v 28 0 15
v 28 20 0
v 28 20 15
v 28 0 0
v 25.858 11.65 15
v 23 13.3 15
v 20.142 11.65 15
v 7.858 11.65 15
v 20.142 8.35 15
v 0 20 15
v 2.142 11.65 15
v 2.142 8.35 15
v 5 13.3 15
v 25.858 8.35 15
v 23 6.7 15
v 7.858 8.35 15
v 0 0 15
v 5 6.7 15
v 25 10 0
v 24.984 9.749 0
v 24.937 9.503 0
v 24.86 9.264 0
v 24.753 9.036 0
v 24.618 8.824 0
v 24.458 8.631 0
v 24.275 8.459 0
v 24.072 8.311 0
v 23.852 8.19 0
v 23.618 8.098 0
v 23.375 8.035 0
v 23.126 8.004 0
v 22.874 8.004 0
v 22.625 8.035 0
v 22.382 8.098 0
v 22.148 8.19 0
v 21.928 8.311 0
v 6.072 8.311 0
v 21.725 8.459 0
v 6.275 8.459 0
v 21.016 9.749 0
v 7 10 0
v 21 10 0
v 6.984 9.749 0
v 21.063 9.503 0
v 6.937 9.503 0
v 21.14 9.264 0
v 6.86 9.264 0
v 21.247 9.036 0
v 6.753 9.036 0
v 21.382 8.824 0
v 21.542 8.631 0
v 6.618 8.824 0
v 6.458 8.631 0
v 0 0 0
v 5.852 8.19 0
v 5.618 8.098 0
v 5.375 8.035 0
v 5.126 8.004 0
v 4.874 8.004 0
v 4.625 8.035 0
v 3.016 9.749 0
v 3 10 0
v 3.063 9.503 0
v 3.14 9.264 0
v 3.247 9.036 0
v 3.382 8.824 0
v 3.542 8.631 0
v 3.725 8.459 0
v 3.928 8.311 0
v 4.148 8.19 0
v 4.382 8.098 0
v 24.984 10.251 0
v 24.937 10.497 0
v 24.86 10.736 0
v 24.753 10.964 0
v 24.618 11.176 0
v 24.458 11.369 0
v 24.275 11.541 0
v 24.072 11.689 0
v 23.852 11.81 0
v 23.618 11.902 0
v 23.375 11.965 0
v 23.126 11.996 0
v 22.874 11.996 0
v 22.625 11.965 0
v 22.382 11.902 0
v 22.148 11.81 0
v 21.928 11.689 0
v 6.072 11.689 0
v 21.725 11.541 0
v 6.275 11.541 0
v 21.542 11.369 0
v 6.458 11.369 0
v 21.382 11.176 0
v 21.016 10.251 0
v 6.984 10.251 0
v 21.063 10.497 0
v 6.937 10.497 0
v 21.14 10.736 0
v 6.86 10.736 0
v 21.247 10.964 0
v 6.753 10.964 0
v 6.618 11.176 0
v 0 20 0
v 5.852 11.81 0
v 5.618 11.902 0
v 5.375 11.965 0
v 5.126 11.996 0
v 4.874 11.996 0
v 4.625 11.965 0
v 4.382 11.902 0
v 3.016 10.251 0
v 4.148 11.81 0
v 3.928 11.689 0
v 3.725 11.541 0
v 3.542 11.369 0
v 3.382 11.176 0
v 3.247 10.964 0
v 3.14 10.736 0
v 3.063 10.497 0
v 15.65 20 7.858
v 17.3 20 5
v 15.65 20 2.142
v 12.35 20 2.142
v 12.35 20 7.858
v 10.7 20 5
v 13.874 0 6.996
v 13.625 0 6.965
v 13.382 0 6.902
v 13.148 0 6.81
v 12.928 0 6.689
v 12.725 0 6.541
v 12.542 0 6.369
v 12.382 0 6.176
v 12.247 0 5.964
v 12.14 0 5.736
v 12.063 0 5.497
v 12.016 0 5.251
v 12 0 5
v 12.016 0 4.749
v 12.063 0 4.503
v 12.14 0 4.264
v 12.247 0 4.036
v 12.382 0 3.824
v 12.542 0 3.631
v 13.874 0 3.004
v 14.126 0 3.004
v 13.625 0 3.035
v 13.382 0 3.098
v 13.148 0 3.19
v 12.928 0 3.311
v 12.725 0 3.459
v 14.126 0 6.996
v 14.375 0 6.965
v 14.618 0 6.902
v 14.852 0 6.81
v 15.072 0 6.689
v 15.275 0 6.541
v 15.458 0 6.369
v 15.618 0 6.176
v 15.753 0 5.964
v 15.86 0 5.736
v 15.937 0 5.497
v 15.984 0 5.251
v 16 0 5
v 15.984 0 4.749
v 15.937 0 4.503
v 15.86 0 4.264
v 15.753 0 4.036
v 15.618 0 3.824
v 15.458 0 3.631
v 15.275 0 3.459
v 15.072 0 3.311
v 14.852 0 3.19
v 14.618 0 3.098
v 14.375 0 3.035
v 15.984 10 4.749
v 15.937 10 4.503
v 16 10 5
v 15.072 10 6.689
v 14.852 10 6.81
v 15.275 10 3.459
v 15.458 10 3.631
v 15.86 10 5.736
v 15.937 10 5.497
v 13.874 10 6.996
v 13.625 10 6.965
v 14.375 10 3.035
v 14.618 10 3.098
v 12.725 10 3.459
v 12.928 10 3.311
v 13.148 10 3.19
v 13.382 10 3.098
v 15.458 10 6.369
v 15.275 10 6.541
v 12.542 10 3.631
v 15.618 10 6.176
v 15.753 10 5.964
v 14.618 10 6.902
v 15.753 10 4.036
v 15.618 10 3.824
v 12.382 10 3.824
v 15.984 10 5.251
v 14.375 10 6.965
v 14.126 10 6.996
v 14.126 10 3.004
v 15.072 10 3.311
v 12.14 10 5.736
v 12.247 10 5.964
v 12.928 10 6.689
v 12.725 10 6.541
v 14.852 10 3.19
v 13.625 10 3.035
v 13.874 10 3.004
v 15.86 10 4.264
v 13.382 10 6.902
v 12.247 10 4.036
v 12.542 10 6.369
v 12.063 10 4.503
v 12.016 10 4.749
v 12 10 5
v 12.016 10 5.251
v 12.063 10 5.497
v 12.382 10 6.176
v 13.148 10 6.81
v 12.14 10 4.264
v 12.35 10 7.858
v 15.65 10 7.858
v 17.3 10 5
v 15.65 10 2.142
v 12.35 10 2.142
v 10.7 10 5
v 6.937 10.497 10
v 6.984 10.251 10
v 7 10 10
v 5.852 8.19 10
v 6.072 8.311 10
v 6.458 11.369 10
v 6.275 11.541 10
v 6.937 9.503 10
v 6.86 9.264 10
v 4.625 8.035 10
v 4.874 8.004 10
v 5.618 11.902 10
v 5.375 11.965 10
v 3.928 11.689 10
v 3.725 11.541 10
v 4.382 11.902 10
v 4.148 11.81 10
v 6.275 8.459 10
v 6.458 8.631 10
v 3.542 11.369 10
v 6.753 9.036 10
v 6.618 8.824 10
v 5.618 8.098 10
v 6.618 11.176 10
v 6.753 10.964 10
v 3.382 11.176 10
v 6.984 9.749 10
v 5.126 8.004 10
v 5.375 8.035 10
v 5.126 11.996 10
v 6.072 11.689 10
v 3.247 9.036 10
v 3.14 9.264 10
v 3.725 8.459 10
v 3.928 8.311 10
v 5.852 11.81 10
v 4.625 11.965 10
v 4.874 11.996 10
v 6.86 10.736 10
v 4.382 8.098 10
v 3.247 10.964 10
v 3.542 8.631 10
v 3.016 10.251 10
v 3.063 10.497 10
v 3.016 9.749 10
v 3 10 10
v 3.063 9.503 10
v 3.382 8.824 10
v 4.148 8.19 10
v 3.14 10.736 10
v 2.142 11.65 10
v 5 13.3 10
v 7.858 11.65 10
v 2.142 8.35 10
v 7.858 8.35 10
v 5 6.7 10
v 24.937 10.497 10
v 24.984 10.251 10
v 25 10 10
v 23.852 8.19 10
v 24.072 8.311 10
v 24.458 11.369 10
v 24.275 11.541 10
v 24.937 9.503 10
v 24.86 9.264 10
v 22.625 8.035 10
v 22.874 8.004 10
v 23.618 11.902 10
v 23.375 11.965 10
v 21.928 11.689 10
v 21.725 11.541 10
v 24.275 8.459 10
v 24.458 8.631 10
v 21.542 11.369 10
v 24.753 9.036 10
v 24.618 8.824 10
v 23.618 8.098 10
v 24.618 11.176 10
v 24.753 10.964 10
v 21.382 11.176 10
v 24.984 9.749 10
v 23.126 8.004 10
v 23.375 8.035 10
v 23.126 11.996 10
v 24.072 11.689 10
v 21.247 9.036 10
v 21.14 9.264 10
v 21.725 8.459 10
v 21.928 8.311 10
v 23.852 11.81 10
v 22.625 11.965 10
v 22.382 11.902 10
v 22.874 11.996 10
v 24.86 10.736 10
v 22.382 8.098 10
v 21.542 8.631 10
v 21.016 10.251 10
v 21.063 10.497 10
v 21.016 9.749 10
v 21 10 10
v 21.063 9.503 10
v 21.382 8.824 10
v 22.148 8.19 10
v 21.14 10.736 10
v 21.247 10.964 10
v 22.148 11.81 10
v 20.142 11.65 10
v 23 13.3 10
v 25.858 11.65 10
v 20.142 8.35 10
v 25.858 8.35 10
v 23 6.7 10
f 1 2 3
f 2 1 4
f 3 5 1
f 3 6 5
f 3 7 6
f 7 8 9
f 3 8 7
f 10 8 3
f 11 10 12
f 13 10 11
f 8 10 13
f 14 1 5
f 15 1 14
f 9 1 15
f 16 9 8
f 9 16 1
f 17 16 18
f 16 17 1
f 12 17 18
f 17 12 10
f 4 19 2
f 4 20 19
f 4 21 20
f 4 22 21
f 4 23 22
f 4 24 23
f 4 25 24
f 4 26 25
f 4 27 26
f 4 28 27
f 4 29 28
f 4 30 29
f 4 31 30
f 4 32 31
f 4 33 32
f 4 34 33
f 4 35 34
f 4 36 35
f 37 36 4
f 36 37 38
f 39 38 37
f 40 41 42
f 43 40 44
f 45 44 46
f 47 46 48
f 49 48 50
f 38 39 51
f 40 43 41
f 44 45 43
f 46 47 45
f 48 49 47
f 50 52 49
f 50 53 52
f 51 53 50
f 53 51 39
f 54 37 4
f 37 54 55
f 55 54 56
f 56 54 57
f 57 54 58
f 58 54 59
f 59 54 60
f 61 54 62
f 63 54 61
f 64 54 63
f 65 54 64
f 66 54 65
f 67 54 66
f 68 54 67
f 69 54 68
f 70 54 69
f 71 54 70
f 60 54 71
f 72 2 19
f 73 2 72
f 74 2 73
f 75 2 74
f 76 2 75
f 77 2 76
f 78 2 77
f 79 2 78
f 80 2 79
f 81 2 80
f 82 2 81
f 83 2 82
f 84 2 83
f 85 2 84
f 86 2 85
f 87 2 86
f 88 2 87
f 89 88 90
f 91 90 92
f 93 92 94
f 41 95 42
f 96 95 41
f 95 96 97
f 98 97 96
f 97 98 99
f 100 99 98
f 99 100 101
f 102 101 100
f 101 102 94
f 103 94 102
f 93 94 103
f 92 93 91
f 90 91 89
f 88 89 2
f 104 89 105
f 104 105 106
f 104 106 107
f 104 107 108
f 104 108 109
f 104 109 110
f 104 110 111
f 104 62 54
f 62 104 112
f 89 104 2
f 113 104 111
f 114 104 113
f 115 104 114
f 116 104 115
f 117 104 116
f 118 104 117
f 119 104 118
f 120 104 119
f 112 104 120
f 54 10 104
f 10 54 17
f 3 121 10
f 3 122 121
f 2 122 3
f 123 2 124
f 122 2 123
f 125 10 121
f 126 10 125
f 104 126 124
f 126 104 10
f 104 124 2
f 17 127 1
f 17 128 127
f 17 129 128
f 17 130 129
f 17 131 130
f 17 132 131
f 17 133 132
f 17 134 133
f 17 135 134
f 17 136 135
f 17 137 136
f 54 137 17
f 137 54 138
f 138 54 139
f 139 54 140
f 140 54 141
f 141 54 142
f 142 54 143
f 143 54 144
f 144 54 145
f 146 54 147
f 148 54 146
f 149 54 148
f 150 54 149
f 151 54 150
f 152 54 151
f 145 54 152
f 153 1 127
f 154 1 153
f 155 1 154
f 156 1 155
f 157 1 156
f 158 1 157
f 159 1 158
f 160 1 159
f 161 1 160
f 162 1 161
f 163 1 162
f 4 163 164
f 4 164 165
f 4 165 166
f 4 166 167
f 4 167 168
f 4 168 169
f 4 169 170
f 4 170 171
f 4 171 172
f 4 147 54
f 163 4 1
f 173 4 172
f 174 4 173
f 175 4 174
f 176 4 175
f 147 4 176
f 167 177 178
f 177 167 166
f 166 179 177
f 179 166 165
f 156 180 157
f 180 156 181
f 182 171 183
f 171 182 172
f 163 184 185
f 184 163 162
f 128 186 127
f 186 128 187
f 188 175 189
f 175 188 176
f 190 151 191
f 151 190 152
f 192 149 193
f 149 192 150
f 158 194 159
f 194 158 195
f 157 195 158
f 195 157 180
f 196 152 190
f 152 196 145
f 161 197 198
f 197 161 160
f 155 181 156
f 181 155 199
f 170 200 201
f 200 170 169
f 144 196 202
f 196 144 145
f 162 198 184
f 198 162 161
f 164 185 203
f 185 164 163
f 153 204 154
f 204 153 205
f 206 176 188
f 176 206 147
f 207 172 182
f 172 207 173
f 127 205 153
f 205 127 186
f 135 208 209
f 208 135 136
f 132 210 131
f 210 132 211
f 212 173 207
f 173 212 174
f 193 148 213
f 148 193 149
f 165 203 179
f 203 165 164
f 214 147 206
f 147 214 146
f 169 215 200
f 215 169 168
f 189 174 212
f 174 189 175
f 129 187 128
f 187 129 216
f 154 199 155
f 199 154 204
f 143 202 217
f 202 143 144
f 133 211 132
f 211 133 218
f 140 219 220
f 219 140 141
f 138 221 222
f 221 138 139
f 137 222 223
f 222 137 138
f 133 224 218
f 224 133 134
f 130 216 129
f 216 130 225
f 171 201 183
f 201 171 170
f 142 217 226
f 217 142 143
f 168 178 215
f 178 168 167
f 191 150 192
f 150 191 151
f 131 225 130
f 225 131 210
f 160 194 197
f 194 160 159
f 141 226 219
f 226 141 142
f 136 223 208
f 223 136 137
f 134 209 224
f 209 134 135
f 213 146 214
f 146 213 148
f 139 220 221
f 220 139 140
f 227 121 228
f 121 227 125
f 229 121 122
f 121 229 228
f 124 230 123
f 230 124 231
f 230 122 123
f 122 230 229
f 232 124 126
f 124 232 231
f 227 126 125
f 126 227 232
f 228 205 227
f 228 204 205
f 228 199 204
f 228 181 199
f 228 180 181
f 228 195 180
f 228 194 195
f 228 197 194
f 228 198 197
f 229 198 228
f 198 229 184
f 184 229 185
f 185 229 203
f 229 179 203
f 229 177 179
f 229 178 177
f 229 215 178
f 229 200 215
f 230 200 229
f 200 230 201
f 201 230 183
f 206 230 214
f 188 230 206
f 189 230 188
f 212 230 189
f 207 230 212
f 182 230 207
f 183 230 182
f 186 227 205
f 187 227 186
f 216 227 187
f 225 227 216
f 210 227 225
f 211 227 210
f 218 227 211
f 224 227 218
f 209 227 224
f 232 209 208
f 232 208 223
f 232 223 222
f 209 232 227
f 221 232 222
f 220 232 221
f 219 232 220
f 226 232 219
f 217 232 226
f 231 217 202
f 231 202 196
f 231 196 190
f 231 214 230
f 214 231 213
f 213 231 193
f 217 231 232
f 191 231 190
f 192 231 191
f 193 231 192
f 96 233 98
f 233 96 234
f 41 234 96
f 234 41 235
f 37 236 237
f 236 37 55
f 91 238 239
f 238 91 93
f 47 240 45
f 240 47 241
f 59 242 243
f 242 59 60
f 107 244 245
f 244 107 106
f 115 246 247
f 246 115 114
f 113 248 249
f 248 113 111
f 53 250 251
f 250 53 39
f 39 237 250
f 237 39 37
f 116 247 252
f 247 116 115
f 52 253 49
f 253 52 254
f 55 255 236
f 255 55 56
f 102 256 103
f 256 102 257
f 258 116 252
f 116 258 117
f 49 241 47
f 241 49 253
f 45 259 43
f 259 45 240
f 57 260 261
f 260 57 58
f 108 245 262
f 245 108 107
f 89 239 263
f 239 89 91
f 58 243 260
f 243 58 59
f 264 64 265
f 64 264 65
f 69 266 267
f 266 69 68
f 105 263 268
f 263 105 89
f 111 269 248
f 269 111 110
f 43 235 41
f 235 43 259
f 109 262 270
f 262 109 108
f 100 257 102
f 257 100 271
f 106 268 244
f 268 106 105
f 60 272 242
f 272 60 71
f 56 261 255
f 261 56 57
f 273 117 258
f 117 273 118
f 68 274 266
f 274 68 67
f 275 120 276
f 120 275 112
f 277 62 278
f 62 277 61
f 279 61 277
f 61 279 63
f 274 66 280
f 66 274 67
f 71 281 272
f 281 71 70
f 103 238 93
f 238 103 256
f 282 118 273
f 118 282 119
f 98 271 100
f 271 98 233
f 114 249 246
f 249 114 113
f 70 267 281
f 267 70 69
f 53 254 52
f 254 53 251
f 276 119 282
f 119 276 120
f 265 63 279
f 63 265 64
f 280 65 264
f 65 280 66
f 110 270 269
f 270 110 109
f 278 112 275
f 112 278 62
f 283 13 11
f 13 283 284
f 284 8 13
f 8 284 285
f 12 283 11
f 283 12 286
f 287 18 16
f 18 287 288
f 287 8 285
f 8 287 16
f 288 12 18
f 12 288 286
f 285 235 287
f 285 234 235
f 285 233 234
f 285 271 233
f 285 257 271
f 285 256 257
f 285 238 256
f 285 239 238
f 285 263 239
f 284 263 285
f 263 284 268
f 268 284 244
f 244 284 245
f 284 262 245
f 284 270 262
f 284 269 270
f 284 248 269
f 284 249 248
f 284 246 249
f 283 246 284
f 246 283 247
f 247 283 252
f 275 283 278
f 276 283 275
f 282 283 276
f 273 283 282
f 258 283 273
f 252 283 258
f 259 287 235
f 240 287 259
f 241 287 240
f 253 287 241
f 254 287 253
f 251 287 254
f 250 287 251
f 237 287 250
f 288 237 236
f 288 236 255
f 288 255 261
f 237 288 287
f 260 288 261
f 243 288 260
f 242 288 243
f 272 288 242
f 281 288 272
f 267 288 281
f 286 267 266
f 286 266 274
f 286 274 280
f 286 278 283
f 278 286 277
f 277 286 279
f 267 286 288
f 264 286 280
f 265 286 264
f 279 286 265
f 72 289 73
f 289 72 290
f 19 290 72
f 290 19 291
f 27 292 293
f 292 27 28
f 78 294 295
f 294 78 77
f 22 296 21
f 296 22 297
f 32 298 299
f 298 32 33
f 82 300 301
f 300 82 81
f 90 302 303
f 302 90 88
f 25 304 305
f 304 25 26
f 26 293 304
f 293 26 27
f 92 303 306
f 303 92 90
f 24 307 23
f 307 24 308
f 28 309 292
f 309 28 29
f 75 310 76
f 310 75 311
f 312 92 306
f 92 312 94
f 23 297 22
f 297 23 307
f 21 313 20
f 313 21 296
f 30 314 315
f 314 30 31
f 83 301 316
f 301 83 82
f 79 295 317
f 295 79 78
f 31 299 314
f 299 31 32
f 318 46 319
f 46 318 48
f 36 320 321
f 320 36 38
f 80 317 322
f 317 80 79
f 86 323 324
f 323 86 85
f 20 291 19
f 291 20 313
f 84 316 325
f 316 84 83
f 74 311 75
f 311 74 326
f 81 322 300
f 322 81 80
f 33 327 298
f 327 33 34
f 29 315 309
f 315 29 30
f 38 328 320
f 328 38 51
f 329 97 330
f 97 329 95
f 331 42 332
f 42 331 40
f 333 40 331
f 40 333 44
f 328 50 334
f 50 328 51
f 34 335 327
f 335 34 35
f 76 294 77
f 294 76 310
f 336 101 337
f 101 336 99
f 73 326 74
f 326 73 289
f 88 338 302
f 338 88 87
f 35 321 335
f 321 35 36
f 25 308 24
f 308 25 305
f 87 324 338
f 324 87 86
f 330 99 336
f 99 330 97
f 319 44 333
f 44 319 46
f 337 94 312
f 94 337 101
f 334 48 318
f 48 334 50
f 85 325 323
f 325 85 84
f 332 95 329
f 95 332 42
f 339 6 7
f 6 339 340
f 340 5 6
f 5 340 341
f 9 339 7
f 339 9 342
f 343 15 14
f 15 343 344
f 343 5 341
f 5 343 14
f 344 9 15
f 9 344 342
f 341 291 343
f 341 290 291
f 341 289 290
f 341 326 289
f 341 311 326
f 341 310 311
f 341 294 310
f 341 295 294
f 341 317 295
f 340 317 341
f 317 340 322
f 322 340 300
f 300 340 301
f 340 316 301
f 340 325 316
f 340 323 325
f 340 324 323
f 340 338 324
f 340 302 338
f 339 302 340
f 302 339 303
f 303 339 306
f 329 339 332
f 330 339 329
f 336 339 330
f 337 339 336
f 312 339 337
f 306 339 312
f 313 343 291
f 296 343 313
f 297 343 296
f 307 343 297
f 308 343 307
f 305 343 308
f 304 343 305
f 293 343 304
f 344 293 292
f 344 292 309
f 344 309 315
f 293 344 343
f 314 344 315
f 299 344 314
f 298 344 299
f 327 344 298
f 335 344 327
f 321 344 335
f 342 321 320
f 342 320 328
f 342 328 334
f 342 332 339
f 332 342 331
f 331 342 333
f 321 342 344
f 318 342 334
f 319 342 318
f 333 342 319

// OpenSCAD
module bridage_plateau(){
    difference(){
        cube([28,20,15]);
        
        //trous pour montage de l'insert
        translate([14,-5,5]){rotate([-90,0,0])cylinder(r=2, h=30, $fn=50);}
        translate([14,10,5]){rotate([-90,0,0])cylinder(r=3.3, h=30, $fn=6);}
        
        //trous de montage sur le plateau
        translate([5,10,-5]){cylinder(r=2, h=30, $fn=50);}
        translate([5,10,10]){rotate([0,0,30])cylinder(r=3.3, h=30, $fn=6);}
        translate([28-5,10,-5]){cylinder(r=2, h=30, $fn=50);}
        translate([28-5,10,10]){rotate([0,0,30])cylinder(r=3.3, h=30, $fn=6);}
    }
    
}

bridage_plateau();
